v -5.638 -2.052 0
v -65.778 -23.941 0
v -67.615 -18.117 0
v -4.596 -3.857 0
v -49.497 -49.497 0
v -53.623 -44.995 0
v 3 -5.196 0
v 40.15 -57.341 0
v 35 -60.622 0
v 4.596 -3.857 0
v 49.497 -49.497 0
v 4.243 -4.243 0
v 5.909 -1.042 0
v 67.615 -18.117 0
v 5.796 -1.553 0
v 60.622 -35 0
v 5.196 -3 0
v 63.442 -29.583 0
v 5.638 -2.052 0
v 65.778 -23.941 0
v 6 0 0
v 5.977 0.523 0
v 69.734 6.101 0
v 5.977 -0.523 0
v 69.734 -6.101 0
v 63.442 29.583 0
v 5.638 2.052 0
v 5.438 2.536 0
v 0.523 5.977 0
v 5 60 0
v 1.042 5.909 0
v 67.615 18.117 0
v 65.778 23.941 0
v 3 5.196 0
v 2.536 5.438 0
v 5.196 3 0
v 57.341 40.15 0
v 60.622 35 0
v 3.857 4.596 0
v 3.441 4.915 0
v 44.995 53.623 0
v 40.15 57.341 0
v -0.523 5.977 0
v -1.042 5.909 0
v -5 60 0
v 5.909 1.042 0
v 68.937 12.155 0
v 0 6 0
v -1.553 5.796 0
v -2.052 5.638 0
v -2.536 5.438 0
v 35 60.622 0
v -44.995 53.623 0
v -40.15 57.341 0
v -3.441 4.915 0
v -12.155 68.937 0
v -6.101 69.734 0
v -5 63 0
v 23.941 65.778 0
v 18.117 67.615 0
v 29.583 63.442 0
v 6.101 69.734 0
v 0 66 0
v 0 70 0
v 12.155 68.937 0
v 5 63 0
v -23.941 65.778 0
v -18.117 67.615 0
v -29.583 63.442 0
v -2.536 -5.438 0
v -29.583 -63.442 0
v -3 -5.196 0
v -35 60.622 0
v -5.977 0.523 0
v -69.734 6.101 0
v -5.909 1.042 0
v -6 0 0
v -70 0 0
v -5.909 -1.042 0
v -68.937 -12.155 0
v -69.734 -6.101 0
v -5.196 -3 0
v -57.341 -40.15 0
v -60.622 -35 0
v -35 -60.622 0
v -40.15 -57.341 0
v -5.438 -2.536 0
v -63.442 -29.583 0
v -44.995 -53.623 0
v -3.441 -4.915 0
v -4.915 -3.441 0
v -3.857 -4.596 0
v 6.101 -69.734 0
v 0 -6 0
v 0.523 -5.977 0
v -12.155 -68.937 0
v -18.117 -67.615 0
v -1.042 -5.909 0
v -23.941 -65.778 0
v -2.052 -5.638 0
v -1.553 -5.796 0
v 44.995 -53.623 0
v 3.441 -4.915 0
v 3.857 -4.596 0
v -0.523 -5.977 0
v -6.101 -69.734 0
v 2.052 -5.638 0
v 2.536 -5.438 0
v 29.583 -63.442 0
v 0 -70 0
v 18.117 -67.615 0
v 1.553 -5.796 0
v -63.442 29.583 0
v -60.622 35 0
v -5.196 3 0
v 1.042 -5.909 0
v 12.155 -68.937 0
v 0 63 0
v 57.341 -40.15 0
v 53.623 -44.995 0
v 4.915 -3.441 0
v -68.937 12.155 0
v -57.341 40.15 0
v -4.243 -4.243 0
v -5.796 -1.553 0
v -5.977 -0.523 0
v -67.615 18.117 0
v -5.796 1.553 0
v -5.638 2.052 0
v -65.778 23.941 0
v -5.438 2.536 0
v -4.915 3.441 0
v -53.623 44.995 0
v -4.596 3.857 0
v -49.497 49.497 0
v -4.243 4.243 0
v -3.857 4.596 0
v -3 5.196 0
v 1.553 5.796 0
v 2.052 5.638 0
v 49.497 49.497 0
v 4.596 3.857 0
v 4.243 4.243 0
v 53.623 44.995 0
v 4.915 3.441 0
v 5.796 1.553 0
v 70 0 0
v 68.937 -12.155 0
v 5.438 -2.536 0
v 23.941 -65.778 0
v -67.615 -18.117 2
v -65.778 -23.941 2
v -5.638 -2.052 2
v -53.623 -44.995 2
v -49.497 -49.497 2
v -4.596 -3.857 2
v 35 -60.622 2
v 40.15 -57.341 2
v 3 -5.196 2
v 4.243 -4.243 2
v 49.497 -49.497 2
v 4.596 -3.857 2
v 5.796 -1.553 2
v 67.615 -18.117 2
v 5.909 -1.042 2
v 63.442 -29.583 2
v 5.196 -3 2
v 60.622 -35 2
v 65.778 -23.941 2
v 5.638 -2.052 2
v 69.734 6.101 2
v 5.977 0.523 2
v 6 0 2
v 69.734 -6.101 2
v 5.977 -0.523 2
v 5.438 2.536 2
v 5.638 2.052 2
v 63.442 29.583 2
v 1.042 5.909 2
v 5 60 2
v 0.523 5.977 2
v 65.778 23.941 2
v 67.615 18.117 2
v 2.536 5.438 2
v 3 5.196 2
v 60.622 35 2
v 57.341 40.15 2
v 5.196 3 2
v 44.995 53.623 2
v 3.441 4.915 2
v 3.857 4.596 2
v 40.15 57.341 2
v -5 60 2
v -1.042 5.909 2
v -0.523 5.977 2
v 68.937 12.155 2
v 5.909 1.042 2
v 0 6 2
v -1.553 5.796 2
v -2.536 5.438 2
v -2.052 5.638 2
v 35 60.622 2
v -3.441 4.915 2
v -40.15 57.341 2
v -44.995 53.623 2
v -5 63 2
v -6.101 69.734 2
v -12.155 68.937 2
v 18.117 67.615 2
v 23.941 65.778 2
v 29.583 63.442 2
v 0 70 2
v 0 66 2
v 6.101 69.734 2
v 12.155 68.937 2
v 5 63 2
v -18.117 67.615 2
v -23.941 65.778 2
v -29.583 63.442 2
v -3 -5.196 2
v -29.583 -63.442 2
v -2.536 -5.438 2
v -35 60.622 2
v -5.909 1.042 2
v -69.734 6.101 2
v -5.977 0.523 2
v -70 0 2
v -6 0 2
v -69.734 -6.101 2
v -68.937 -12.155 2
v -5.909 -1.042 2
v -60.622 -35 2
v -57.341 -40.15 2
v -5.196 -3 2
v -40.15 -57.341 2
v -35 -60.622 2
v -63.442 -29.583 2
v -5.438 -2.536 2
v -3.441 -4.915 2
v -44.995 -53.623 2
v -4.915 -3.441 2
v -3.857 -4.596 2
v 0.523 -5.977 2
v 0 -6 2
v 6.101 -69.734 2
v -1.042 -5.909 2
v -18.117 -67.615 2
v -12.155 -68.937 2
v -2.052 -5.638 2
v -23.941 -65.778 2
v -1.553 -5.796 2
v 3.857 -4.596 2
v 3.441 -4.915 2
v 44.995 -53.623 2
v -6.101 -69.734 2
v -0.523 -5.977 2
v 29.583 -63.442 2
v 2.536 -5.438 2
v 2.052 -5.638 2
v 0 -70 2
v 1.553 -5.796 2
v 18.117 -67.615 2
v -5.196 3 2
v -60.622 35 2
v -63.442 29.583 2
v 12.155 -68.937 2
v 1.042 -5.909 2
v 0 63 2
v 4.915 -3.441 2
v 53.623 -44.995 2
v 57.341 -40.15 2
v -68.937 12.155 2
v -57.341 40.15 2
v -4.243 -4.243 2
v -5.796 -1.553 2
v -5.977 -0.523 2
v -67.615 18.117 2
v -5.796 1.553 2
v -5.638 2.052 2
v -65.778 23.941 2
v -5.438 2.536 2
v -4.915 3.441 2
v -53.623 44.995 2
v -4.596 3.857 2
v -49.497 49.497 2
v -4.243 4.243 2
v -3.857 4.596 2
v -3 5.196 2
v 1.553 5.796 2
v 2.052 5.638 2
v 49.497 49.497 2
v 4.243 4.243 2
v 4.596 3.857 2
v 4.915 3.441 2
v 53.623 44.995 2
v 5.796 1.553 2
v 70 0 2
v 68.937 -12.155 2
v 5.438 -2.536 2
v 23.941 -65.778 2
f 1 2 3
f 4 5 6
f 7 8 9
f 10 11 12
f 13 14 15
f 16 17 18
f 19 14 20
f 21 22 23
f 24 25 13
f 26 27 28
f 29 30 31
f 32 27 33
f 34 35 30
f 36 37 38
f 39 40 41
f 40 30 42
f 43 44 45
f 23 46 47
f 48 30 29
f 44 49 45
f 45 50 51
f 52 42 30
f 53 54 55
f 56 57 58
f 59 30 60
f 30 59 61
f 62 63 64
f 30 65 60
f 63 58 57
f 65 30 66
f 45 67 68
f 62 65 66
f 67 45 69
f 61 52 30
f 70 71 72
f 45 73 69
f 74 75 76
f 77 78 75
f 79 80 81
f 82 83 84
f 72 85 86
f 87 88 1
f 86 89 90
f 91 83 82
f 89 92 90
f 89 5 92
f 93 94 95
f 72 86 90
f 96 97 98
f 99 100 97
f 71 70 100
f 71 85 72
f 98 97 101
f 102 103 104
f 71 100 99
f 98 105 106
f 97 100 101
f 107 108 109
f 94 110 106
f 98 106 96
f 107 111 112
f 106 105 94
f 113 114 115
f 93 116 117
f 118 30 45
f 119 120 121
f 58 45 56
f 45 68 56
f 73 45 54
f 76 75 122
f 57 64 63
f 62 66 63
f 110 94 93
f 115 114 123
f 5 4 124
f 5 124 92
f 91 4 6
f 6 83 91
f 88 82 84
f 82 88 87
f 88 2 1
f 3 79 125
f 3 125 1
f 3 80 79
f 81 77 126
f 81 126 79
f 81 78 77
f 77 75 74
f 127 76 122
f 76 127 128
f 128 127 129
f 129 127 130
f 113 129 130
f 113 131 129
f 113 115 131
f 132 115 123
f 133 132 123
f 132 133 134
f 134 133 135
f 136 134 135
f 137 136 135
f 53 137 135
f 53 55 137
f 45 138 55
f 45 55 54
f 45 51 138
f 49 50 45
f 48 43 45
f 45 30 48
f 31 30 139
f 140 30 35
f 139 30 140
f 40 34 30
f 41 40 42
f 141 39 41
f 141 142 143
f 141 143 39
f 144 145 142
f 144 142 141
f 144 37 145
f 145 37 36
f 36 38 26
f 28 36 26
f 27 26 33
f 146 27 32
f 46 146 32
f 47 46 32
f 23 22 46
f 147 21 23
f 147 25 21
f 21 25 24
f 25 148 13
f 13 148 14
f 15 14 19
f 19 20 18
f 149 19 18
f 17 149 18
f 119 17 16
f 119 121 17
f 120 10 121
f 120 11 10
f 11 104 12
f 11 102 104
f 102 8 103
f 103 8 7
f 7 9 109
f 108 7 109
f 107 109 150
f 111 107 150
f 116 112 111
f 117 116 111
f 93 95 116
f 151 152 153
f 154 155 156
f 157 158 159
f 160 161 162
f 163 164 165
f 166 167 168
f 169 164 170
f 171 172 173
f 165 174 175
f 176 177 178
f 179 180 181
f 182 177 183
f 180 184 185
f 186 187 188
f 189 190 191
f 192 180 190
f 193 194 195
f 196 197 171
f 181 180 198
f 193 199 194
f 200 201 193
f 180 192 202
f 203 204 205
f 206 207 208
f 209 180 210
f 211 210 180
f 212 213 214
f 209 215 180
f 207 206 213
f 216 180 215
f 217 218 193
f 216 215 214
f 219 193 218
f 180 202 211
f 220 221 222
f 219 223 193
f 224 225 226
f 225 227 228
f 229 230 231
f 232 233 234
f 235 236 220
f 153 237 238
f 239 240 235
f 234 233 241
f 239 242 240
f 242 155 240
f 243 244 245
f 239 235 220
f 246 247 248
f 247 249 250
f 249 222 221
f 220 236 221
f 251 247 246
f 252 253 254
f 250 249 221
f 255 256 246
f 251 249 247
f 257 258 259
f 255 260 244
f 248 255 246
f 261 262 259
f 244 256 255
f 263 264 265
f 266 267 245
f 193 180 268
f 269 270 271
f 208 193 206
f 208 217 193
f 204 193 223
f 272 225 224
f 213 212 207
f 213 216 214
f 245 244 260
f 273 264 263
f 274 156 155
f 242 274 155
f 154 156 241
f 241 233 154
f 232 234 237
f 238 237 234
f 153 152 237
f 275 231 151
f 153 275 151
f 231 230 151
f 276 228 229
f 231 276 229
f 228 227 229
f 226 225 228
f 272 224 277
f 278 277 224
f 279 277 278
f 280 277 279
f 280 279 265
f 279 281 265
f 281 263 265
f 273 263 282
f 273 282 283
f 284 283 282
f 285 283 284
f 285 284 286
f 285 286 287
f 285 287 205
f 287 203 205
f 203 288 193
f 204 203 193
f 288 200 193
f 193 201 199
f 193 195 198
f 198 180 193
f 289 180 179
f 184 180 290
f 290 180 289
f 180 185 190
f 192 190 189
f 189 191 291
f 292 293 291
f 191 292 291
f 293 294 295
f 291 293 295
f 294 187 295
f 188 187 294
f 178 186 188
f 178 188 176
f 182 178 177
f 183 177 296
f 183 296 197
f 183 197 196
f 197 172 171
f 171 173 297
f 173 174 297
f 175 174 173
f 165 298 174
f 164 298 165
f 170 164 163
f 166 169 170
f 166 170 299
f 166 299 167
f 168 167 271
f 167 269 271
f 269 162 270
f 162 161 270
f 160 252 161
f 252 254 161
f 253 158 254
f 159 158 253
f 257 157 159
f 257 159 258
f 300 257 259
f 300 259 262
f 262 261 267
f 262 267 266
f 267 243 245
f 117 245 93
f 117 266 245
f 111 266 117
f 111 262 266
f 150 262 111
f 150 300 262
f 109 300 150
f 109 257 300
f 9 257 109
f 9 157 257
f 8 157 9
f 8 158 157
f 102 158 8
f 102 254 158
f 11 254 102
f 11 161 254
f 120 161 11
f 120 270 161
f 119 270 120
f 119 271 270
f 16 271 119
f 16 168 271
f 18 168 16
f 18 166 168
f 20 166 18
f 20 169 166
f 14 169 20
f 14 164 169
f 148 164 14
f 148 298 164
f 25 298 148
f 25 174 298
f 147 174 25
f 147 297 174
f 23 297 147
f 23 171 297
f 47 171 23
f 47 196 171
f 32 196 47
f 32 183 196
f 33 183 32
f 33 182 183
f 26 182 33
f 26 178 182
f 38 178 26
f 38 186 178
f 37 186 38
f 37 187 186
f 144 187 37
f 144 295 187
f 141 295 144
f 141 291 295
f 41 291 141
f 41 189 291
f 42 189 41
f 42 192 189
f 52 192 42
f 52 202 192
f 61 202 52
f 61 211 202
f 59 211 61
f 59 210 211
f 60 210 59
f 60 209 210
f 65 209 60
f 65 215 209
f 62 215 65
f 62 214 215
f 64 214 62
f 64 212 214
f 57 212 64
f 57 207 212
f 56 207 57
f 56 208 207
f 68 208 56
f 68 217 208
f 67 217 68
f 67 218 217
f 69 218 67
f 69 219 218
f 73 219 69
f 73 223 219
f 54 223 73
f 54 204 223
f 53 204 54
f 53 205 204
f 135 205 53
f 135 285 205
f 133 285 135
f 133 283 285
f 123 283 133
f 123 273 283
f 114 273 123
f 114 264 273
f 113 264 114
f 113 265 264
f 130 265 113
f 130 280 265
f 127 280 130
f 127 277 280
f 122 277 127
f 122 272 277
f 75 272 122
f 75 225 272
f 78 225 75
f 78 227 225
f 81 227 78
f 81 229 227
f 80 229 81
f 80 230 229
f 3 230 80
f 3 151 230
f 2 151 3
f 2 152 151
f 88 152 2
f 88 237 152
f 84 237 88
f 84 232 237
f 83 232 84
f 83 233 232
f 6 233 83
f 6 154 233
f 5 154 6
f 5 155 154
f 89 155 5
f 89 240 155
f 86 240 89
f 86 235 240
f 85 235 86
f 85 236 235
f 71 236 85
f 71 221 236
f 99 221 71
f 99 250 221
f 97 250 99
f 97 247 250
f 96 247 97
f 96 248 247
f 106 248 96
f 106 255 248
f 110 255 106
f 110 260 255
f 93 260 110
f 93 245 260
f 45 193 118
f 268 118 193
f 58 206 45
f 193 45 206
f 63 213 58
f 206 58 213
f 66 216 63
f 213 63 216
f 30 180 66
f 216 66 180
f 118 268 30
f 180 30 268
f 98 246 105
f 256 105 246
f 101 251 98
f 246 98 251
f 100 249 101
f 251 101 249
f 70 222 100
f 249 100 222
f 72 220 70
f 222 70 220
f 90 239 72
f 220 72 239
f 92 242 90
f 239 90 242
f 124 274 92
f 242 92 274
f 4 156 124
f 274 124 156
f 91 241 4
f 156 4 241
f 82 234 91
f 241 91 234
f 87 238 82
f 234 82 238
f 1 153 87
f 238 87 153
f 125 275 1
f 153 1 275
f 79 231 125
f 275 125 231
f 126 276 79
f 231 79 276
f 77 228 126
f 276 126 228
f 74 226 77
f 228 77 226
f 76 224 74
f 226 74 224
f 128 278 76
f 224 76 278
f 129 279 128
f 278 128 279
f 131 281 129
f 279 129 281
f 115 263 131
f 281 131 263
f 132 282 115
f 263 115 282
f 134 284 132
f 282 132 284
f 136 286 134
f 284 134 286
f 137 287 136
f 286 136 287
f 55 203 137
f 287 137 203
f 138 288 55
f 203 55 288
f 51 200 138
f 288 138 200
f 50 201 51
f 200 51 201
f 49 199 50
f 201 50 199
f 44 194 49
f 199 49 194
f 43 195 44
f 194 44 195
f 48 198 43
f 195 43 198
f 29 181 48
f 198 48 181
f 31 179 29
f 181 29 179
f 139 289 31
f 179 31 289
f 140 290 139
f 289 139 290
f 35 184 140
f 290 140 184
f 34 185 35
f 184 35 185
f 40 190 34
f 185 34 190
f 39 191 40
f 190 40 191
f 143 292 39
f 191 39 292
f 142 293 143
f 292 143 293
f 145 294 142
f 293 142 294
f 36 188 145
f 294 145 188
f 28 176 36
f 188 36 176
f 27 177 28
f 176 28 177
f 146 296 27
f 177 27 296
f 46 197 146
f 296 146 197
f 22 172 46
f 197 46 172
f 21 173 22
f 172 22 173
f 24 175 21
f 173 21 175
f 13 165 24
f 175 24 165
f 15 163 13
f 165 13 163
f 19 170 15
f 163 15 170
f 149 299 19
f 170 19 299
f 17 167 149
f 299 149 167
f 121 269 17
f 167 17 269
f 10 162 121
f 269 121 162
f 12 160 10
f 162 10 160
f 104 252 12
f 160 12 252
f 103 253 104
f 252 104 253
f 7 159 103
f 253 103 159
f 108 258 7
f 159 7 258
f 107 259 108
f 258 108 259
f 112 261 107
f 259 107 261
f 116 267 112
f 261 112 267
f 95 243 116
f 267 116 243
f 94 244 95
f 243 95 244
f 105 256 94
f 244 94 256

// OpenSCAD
// file: assemblies/LogoBot.scad
//
// LogoBot Assembly
//

// LogoBot Orientation
// -----------
// Centred at the origin
// Width is along the x-axis
// Depth is along the y-axis
// Front is towards y+


module LogoBotAssembly() {
	
	// Base
	// TODO: needs to be translated up to correct height
	translate([0, 0, 0])
		LogoBotBase_stl();
	
	// Bumper assembly
	
	// Motor + Wheel assembly
	
	// Battery assembly
	
	// Shell
	
	// etc
	
}


// The _stl suffix denotes this is a printable part, 
// and is used by the bulk STL generating program

module LogoBotBase_stl() {
	// Base lies on XY plane, centered on origin - ready for printing!
	// Front of robot is towards y+
	
	// Color it as a printed plastic part
	color(PlasticColor)
		// Pre-render to speed editing and avoid overloading the cache
		render()
		// Extrude to correct thickness
		linear_extrude(BaseThickness)
		difference() {
			// Union together all the bits to make the plate
			union() {
				// Base plate
				circle(r=BaseDiameter/2);
			}
			
			// Now punch some holes...
		
			// Centre hole for pen
			circle(r=PenHoleDiameter/2);
	
			// Chevron at the front so we're clear where the front is!
			translate([0, BaseDiameter/2 - 10, 0])
				Chevron(width=10, height=6, thickness=3);
	
		}
}
// file: vitamins/PlasticCastor.scad
//
// Plastic Castor
//
// Example vitamin library that models a simple plastic castor wheel


// Chevron
// Width is along x, height is along y, points towards y+
// Centred along x, base on y=0
module Chevron(width=10, height=6, thickness=3) {

	// Union the two halves together
	union() {	
		// short loop to mirror the sides
		for (x=[0,1])
			// mirror the two sides
			mirror([x,0,0])
			// polygon to define the right (x+) side of the chevron shape
			polygon([
				[0, height],  			// tip of chevron 
				[width/2, thickness],  	// top right corner
				[width/2, 0],			// bottom right corner	
				[0, height-thickness]	// inside tip
			]);
	}
}
// file: utils/chevron.scad
//
// Chevron
//
// Utility module for making 2D chevrons


// Chevron
// Width is along x, height is along y, points towards y+
// Centred along x, base on y=0
module Chevron(width=10, height=6, thickness=3) {

	// Union the two halves together
	union() {	
		// short loop to mirror the sides
		for (x=[0,1])
			// mirror the two sides
			mirror([x,0,0])
			// polygon to define the right (x+) side of the chevron shape
			polygon([
				[0, height],  			// tip of chevron 
				[width/2, thickness],  	// top right corner
				[width/2, 0],			// bottom right corner	
				[0, height-thickness]	// inside tip
			]);
	}
}
// file: config/assemblies.scad
//
// Assemblies
//

// Add list of include statements like this:
//include <../assemblies/myassembly.scad>

// Order the include statements such that the lowest sub-assemblies are first





// this one goes last!
include <../assemblies/LogoBot.scad>
// file: config/machine.scad
//
// Machine
//

// Coding-style
// ------------
// 
// Global variables are written in UpperCamelCase.
// A logical hierarchy should be indicated using underscores, for example:
//     StepperMotor_Connections_Axle
//
// Global short-hand references should be kept to a minimum to avoid name-collisions


// Global Settings for Printed Parts
//

DefaultWall 	= 4*perim;
ThickWall 		= 8*perim;

// short-hand
dw 				= DefaultWall;
tw 				= ThickWall;



// Wheels
//

WheelDiameter 	= 80;
WheelRadius 	= WheelDiameter / 2;
WheelThickness 	= dw;


// Base
//

BaseDiameter 	= 140;
BaseThickness 	= dw;


// Pen
//

PenHoleDiameter = 12;
// file: config/vitamins.scad
//
// Vitamins

// Add list of include statements like this:
//include <../vitamins/myvitamin.scad>

// Order alphabetically

include <../vitamins/PlasticCastor.scad>
// file: config/utils.scad
//
// Utils

// Add list of include statements like this:
//include <../utils/myutility.scad>

// Order alphabetically


include <../utils/chevron.scad>
// file: config/colors.scad
//
// Colors
//


// Coding-style
// ------------
// 
// Colors are global variables, and are therefore written in UpperCamelCase.
//
// Generic colors should use their normal descriptive name for the variable name.
// Material-specific colours should have a Color suffix


// Generic Colors
// =======================

Brass                           = "gold";
Grey20                          = [0.2, 0.2, 0.2];
Grey50                          = [0.5, 0.5, 0.5];
Grey60							= [0.6, 0.6, 0.6];
Grey70                          = [0.7, 0.7, 0.7];
Grey80                          = [0.8, 0.8, 0.8];
Grey90                          = [0.9, 0.9, 0.9];

// Material Colors
// ===============

AluColor  						= Grey70;
MetalColor						= Grey60;
BeltColor 						= "white";
PlasticColor 					= "orange";
PolycarbonateColor 			 	= [1,0.8,0.5,0.5];
SiliconeColor 					= [1,0.8,0.8,0.8];
WoodColor 						= "orange";


// Material Color aliases
// For compatibility with 3rd party libraries
//

hard_washer_color				 = Grey50;
screw_cap_color 				 = Grey20;
nut_color						 = Grey50;
// file: config/config.scad
//
// Config
//

// Coding-style
// ------------
// 
// Global variables are written in UpperCamelCase.
// A logical hierarchy should be indicated using underscores, for example:
//     StepperMotor_Connections_Axle
//
// Global short-hand references should be kept to a minimum to avoid name-collisions



// Global OpenSCAD variables - short-hand!
// 
eta = 0.01;                     // small fudge factor to stop CSG barfing on coincident faces.
$fa = 5;
$fs = 0.5;

// Printer specific parameters
//
Perim = 0.5;    // perim extrusion width for 0.2 or 0.3 layer height
Layers = 0.3;
2Perim = 2*Perim;
4Perim = 4*Perim;

// short-hand
perim = Perim;
layers = Layers;
2perim = 2Perim;
4perim = 4Perim;


include <colors.scad>
include <utils.scad>
include <vitamins.scad>
include <machine.scad>
include <assemblies.scad>
// main file
/*

LogoBot.scad

*/

// Master include statement, causes everything else for the model to be included
include <config/config.scad>


// Master assembly
LogoBotAssembly();
